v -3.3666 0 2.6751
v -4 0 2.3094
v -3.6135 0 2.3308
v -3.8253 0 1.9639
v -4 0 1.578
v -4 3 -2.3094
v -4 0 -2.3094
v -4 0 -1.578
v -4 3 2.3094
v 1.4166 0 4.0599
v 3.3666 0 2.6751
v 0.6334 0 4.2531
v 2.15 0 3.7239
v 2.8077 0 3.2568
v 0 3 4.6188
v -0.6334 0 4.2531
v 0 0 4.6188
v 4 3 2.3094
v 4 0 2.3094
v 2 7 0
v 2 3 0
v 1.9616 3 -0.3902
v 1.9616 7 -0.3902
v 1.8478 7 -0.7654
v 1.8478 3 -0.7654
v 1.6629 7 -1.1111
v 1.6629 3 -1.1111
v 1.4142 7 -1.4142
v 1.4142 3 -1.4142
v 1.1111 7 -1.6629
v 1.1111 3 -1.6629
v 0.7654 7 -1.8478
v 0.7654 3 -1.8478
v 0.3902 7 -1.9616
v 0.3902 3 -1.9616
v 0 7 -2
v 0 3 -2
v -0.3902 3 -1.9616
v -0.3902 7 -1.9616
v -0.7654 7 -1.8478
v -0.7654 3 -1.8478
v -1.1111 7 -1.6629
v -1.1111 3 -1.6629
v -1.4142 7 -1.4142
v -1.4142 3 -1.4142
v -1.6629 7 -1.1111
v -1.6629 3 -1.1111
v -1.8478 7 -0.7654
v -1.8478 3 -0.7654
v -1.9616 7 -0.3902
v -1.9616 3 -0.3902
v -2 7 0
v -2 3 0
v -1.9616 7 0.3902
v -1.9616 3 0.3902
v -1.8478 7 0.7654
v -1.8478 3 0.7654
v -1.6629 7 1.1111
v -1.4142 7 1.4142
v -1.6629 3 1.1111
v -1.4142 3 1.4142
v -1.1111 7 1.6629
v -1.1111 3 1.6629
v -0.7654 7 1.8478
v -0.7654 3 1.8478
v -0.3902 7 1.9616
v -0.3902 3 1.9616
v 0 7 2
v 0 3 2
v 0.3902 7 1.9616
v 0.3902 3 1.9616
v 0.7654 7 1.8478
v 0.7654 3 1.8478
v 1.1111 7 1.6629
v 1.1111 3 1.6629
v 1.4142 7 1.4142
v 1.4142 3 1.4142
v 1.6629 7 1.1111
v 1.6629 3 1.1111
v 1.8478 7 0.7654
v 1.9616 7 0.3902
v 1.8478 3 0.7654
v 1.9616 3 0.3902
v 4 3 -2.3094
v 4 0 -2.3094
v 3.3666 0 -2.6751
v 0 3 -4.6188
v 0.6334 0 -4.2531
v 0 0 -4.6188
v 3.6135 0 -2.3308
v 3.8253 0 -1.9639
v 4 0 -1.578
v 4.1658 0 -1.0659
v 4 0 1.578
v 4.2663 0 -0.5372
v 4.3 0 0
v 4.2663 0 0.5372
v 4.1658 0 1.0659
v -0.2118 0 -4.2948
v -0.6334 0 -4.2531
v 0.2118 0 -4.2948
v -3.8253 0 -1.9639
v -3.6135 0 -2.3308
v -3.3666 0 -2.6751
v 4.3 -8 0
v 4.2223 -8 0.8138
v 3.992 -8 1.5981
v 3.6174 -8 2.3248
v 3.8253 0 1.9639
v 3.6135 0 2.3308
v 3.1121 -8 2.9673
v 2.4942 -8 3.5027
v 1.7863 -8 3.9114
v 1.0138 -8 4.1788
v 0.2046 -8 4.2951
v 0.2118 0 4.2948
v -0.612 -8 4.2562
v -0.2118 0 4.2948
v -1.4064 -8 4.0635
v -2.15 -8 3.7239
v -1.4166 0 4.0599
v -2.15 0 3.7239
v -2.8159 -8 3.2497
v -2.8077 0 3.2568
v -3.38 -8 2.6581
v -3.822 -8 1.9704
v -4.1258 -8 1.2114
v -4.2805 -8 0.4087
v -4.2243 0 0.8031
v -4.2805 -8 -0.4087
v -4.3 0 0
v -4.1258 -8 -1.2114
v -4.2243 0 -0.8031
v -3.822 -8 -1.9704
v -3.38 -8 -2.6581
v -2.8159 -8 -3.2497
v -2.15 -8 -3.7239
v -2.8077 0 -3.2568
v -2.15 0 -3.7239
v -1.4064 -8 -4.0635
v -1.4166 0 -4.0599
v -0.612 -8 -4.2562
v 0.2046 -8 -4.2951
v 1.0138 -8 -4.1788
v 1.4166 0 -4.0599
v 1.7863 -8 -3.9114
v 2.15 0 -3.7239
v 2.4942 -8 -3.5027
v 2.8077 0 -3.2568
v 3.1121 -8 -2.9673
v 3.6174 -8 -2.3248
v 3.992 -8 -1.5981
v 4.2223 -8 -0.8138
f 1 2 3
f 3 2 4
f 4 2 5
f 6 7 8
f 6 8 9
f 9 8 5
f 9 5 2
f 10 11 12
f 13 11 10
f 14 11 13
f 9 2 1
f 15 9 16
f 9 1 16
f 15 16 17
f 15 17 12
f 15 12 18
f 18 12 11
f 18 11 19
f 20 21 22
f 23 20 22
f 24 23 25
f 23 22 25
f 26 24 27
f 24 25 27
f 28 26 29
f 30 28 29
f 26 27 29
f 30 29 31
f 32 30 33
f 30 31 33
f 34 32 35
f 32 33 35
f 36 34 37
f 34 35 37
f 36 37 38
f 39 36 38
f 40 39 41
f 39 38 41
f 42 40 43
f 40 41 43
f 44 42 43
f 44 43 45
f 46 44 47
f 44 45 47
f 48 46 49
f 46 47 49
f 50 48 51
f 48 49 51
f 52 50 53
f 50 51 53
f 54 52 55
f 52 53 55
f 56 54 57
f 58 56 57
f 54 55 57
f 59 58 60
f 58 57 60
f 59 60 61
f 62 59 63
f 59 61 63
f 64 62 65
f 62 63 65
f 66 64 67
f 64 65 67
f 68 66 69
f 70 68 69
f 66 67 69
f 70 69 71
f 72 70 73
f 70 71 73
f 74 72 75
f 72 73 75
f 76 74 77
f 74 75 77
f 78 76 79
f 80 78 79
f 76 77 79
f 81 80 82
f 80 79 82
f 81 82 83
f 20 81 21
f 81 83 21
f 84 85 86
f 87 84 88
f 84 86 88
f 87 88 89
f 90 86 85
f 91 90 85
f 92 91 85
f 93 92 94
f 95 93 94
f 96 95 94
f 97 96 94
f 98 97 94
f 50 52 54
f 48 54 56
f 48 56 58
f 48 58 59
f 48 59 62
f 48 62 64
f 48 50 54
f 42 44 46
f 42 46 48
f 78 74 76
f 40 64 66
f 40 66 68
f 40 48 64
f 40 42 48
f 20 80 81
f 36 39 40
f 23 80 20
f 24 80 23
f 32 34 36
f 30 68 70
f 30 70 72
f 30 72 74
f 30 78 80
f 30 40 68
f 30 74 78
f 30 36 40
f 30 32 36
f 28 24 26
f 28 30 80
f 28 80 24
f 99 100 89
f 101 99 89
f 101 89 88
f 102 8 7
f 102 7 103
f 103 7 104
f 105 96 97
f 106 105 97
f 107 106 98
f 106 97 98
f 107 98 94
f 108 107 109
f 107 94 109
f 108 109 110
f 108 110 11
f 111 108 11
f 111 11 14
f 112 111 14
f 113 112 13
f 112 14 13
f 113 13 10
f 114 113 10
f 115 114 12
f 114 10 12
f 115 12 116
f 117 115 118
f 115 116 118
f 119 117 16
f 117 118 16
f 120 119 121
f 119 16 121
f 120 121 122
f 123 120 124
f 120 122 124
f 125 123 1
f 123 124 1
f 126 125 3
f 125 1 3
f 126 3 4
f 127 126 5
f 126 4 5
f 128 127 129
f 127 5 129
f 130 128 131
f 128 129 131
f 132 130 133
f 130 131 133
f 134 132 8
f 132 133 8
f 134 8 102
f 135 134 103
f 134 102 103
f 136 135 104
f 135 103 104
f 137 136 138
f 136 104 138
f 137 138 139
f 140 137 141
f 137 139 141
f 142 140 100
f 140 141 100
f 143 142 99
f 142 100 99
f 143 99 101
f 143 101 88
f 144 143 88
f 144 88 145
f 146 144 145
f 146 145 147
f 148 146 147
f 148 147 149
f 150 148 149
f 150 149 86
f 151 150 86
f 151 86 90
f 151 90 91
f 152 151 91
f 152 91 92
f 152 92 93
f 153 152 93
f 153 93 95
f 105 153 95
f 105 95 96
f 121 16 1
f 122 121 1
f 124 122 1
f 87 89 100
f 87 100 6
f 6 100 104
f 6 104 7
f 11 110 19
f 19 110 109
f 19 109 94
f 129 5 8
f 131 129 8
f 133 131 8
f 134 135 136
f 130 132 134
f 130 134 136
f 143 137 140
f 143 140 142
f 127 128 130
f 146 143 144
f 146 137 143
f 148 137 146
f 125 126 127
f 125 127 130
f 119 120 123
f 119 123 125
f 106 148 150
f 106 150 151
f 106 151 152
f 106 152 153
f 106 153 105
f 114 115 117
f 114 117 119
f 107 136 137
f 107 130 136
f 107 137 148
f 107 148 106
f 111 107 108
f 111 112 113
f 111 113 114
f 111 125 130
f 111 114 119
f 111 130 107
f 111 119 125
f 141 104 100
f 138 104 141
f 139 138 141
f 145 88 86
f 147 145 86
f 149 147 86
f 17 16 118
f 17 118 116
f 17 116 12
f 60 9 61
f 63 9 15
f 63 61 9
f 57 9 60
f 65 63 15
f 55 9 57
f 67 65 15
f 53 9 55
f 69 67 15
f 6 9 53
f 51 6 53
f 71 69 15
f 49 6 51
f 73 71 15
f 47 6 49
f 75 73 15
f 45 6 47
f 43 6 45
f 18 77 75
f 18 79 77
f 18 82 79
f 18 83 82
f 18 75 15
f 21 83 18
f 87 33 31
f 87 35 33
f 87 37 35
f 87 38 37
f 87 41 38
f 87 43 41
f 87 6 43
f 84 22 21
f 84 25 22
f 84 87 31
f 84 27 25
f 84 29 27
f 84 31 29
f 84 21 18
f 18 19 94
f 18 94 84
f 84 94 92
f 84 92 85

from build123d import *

# Parameters (mm, degrees)
BOSS_EXTRUDE1_DEPTH = 3
SKETCH2_R           = 4.3
BOSS_EXTRUDE2_DEPTH = 8
SKETCH3_R           = 2
BOSS_EXTRUDE3_DEPTH = 4


with BuildPart() as part:
    # Sketch1 → Boss-Extrude1 (new body)
    with BuildSketch(Plane(origin=(0, 0, 0), x_dir=(1, 0, 0), z_dir=(0, 1, 0))):
        Polygon((0, -4.618802154), (4, -2.309401077), (4, 2.309401077), (0, 4.618802154), (-4, 2.309401077), (-4, -2.309401077), align=None)
    extrude(amount=BOSS_EXTRUDE1_DEPTH)

    # Sketch2 → Boss-Extrude2 (add)
    with BuildSketch(Plane.XZ):
        Circle(SKETCH2_R)
    extrude(amount=BOSS_EXTRUDE2_DEPTH)

    # Sketch3 → Boss-Extrude3 (add)
    with BuildSketch(Plane(origin=(0, 3, 0), x_dir=(1, 0, 0), z_dir=(0, 1, 0))):
        Circle(SKETCH3_R)
    extrude(amount=BOSS_EXTRUDE3_DEPTH)


solid = part.part
